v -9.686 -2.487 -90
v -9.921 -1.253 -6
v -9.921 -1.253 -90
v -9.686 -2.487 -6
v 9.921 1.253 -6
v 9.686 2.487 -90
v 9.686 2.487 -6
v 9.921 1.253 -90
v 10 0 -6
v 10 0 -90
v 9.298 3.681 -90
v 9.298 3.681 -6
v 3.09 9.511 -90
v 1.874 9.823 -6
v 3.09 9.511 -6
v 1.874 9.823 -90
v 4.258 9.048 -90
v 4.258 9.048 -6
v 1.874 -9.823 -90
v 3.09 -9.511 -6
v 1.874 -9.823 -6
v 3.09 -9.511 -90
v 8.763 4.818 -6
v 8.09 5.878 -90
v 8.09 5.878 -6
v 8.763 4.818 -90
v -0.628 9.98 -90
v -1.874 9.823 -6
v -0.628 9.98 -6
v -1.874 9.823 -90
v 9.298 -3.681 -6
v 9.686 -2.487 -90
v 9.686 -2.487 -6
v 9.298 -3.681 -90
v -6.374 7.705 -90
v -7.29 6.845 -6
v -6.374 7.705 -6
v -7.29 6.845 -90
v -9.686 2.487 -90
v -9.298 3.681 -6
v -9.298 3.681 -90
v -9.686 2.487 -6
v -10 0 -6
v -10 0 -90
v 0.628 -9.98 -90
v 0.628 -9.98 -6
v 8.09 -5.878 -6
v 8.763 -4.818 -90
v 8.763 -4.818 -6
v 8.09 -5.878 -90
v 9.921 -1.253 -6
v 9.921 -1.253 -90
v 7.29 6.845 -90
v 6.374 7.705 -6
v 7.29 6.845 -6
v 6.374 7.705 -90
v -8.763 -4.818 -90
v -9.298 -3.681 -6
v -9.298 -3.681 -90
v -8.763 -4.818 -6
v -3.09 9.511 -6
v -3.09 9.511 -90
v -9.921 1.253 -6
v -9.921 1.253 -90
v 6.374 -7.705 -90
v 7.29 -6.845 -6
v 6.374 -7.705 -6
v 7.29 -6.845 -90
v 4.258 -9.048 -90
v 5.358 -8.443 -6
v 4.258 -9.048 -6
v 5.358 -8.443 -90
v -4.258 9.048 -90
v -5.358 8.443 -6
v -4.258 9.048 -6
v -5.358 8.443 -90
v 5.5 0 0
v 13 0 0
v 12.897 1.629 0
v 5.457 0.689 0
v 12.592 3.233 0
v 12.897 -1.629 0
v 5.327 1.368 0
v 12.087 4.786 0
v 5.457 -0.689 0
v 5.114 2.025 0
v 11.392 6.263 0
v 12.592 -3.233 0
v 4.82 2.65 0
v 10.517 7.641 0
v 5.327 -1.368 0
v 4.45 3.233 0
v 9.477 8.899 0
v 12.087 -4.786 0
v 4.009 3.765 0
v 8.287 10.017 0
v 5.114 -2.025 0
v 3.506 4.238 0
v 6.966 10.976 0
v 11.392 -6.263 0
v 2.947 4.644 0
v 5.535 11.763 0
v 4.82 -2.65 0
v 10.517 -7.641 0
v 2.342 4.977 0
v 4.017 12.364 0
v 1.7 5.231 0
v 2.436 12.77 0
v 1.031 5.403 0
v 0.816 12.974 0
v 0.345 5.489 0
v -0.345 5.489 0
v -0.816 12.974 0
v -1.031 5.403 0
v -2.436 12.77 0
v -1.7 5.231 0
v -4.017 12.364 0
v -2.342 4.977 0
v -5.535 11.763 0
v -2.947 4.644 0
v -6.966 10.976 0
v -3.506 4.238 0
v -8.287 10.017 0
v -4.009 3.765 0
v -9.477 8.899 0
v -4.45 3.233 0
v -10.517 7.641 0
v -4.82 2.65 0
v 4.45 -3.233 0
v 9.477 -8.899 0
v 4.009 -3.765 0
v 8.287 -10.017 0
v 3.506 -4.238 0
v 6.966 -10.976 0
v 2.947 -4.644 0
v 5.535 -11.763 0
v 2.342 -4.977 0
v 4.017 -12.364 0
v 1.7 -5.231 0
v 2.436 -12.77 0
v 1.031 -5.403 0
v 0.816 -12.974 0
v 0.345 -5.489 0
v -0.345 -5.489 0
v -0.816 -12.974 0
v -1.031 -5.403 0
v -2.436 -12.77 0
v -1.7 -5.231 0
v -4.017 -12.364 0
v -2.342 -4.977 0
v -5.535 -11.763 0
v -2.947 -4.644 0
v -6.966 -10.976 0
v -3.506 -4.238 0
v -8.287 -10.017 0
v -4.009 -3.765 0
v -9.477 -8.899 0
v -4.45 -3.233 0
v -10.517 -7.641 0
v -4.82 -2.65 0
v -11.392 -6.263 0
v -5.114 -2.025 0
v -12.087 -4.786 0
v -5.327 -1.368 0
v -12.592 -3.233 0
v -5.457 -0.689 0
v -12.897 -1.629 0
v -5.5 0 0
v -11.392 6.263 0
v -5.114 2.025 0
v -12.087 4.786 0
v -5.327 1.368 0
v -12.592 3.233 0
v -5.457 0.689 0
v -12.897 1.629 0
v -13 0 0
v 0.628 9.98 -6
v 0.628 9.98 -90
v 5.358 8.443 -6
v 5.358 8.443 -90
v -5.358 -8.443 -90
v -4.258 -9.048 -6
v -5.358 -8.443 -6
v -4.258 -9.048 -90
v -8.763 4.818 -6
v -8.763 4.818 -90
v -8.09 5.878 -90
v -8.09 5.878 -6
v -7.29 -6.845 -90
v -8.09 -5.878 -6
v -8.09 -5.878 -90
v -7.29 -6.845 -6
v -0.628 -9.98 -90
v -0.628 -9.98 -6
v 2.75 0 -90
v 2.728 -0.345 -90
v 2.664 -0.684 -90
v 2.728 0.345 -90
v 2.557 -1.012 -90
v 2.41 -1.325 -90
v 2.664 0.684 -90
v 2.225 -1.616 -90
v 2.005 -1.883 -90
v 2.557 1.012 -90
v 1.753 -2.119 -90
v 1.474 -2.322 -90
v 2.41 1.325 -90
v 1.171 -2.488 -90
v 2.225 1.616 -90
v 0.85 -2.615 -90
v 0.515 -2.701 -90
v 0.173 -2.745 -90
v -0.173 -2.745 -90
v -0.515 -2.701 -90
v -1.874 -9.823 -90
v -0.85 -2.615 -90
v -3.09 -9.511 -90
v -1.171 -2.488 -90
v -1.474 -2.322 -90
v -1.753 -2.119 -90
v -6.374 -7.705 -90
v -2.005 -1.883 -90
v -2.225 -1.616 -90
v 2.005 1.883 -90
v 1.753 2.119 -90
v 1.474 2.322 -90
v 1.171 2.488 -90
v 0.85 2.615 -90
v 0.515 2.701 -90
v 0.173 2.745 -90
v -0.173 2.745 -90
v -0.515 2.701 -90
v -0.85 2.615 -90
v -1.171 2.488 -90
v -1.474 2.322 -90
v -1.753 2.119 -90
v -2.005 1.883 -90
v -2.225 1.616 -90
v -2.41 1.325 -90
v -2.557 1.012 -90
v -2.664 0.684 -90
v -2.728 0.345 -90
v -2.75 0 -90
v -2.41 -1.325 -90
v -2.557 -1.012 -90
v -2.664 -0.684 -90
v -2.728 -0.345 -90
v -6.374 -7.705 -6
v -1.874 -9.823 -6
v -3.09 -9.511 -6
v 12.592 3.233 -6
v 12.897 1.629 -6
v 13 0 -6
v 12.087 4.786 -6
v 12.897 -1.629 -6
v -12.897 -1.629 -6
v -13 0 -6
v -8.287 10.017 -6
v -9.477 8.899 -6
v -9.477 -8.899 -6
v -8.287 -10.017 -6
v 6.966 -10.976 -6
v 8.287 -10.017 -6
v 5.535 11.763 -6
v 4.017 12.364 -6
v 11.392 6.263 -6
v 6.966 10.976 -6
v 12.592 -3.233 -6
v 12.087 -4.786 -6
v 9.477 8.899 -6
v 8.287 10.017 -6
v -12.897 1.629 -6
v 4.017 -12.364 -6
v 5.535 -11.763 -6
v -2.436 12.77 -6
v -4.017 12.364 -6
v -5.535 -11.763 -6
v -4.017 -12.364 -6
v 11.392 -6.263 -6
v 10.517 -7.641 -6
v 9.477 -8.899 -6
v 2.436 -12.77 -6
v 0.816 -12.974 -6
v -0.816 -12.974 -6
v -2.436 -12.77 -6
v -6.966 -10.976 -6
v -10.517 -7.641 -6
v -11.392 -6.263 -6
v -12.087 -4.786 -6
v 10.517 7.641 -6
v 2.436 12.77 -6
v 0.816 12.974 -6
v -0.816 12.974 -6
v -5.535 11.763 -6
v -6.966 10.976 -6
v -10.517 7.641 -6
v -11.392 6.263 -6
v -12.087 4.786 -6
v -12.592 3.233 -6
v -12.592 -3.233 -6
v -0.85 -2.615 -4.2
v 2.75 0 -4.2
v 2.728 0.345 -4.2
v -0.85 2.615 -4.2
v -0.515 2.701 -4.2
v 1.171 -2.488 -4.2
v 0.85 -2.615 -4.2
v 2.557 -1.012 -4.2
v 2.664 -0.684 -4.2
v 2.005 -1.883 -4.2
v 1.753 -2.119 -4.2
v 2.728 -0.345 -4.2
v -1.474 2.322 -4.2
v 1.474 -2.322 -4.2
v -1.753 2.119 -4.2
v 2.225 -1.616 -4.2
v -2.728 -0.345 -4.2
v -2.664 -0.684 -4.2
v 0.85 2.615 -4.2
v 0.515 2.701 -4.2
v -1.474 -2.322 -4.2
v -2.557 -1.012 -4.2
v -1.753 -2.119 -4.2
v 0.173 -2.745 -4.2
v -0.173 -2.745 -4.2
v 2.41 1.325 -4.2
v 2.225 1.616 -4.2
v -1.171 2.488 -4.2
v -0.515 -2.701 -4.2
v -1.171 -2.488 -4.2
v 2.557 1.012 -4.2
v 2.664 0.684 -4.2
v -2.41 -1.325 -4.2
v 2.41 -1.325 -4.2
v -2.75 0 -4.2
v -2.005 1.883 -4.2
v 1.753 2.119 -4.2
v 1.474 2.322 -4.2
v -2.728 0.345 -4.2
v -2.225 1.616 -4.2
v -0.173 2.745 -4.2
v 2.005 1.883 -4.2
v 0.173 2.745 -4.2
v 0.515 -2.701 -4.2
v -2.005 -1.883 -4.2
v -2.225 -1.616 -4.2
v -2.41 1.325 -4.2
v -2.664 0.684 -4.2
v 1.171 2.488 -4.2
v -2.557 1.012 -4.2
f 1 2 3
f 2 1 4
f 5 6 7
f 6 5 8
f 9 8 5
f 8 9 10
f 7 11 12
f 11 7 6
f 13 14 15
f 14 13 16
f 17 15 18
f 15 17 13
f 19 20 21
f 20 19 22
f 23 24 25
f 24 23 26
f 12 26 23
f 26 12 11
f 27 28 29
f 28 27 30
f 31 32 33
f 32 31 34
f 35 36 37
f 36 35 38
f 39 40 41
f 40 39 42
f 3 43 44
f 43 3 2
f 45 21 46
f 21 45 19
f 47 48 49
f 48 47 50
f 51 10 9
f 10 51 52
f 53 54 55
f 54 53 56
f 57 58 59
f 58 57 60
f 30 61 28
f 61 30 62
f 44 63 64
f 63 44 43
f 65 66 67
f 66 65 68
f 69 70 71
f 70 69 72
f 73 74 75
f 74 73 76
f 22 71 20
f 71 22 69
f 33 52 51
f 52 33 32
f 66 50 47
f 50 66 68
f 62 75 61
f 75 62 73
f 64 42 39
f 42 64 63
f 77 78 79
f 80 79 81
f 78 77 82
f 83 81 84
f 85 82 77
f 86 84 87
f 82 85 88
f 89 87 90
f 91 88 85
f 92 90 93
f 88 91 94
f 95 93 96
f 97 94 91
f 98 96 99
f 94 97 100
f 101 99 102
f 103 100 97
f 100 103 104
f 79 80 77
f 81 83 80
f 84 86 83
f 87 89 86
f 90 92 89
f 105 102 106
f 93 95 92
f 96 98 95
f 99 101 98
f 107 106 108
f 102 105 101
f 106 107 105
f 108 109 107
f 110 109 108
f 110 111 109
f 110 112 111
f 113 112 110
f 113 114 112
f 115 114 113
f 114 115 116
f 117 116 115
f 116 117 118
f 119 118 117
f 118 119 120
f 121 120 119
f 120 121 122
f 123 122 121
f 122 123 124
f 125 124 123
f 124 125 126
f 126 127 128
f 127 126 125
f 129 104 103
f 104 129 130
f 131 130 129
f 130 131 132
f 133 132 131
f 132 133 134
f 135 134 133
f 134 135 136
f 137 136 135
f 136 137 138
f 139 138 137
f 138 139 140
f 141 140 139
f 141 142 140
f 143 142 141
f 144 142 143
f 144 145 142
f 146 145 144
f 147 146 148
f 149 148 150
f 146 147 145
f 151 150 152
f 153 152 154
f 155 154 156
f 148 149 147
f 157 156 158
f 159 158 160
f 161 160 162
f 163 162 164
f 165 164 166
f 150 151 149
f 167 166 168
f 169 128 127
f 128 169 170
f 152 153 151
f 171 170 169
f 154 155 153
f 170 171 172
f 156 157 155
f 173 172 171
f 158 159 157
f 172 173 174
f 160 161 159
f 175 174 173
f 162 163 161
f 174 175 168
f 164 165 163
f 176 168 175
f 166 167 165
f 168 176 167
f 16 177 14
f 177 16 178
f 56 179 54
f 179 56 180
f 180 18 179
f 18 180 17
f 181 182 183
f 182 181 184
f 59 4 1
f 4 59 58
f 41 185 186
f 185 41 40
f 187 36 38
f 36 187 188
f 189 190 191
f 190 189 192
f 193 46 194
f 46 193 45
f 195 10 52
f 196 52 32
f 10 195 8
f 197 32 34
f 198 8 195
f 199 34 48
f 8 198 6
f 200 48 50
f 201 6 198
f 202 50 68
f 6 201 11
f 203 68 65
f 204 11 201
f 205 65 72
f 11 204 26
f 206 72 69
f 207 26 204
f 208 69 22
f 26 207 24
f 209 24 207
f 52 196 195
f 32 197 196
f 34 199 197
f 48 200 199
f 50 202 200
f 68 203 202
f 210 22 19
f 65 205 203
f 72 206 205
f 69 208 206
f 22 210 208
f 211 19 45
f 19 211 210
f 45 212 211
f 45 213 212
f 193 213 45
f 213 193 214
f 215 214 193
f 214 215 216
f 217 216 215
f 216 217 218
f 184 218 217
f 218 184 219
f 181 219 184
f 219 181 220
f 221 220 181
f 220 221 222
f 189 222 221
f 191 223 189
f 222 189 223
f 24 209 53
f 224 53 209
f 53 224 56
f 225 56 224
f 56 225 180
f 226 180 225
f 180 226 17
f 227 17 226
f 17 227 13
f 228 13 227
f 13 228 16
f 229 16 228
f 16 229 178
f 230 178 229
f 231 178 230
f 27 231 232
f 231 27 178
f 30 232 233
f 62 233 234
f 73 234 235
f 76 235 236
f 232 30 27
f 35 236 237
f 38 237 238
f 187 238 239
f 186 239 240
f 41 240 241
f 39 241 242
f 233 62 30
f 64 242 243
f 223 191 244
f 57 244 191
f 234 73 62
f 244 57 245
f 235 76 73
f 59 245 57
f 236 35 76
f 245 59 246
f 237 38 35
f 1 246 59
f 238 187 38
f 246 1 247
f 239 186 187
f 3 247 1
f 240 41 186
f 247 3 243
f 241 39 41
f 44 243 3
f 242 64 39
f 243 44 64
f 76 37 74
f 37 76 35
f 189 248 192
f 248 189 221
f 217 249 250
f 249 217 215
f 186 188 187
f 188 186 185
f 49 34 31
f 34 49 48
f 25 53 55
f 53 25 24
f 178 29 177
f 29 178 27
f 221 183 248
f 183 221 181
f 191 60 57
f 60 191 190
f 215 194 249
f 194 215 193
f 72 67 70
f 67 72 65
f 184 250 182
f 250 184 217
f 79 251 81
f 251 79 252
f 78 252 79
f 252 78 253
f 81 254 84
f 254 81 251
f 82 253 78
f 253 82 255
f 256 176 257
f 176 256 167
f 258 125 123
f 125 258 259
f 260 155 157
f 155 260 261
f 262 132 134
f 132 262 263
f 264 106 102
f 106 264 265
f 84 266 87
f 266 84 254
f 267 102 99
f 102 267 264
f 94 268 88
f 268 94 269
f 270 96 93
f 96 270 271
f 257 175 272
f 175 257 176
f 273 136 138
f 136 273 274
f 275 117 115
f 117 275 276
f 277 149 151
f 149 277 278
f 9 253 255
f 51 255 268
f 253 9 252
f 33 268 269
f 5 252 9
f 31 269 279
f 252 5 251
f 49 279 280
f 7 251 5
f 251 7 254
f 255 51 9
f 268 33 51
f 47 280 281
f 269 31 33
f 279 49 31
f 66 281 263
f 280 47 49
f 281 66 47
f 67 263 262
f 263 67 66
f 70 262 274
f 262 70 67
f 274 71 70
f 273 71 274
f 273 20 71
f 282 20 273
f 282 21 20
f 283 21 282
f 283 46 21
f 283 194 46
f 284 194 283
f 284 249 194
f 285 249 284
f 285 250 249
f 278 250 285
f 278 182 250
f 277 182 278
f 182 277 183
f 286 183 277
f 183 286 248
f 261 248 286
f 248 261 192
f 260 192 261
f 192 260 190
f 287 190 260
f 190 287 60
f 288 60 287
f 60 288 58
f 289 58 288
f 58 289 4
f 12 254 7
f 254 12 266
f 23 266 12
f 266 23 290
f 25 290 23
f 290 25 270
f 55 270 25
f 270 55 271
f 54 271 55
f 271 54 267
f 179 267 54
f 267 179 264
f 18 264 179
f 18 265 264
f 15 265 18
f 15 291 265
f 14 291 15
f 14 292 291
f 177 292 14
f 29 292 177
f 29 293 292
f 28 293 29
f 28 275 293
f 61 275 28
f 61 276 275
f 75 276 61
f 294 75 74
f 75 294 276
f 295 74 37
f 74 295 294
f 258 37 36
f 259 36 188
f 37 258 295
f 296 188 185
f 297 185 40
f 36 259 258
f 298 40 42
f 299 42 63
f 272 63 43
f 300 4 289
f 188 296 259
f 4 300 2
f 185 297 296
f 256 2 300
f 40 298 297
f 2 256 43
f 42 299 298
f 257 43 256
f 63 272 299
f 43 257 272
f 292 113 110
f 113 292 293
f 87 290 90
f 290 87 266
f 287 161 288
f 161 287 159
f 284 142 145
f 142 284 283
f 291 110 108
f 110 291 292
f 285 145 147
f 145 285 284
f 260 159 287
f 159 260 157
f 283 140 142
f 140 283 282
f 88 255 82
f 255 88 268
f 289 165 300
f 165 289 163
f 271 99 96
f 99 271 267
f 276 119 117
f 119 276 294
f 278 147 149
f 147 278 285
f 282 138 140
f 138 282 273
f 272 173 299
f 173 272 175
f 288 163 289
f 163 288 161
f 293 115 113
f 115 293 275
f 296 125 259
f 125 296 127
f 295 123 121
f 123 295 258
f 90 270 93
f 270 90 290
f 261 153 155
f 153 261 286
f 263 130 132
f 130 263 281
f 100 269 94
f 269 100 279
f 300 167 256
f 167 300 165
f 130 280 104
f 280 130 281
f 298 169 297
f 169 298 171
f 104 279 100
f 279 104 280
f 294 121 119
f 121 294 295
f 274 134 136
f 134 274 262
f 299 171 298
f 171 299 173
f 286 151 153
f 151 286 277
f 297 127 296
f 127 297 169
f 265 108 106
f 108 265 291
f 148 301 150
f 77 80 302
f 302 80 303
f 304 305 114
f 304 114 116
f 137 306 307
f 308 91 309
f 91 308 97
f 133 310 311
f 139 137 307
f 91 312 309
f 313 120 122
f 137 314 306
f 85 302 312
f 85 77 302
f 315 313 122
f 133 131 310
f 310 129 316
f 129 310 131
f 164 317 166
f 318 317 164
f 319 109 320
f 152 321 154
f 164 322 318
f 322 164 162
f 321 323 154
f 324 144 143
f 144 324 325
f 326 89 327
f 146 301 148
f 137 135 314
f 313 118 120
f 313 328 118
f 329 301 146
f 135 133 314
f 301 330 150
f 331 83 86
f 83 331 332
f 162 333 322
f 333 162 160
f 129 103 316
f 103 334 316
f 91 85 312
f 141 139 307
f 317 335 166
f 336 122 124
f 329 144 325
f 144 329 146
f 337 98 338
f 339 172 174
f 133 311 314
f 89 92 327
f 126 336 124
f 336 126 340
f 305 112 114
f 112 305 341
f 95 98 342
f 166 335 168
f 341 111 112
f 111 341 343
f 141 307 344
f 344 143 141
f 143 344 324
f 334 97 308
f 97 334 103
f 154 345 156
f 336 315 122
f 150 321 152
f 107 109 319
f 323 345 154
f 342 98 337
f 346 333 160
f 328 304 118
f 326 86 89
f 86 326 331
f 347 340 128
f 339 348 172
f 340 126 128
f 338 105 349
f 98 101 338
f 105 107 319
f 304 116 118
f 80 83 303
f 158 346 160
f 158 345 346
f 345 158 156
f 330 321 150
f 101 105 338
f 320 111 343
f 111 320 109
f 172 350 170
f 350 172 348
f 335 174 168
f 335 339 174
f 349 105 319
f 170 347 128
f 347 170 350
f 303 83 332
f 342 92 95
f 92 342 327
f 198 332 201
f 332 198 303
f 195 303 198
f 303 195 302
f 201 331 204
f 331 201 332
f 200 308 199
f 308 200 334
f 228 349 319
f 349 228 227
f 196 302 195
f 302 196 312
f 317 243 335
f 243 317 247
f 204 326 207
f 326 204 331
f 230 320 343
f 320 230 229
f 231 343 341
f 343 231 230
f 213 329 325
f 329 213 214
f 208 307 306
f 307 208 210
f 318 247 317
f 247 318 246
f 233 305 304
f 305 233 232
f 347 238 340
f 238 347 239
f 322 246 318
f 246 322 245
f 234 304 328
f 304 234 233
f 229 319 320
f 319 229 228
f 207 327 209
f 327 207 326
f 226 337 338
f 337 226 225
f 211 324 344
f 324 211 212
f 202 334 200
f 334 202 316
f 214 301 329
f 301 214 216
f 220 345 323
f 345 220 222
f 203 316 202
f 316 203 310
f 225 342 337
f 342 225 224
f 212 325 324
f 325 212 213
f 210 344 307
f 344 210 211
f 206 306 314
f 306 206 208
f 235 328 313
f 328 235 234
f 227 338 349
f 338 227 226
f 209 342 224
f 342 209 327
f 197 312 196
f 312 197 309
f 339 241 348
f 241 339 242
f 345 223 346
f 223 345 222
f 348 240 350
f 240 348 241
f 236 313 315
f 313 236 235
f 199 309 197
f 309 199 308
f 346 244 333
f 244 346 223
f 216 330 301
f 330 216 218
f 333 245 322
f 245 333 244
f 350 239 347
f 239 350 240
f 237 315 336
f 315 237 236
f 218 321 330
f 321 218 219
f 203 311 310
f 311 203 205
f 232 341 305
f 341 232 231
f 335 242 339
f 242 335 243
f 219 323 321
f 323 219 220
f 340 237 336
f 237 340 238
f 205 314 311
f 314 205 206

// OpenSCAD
$fn = 50;


difference() {
	union() {
		translate(v = [0, 0, -90.0000000000]) {
			cylinder(h = 90, r = 10.0000000000);
		}
		translate(v = [0, 0, -6.0000000000]) {
			cylinder(h = 6, r = 13.0000000000);
		}
	}
	union() {
		translate(v = [0, 0, 0]) {
			rotate(a = [0, 0, 0]) {
				difference() {
					union() {
						#translate(v = [0, 0, -90.0000000000]) {
							cylinder(h = 90, r = 2.2500000000);
						}
						#translate(v = [0, 0, -4.2000000000]) {
							cylinder(h = 4.2000000000, r = 10.0000000000, r1 = 2.7500000000, r2 = 5.5000000000);
						}
						#translate(v = [0, 0, -90.0000000000]) {
							cylinder(h = 90, r = 2.7500000000);
						}
						#translate(v = [0, 0, -90.0000000000]) {
							cylinder(h = 90, r = 2.2500000000);
						}
					}
					union();
				}
			}
		}
	}
}
